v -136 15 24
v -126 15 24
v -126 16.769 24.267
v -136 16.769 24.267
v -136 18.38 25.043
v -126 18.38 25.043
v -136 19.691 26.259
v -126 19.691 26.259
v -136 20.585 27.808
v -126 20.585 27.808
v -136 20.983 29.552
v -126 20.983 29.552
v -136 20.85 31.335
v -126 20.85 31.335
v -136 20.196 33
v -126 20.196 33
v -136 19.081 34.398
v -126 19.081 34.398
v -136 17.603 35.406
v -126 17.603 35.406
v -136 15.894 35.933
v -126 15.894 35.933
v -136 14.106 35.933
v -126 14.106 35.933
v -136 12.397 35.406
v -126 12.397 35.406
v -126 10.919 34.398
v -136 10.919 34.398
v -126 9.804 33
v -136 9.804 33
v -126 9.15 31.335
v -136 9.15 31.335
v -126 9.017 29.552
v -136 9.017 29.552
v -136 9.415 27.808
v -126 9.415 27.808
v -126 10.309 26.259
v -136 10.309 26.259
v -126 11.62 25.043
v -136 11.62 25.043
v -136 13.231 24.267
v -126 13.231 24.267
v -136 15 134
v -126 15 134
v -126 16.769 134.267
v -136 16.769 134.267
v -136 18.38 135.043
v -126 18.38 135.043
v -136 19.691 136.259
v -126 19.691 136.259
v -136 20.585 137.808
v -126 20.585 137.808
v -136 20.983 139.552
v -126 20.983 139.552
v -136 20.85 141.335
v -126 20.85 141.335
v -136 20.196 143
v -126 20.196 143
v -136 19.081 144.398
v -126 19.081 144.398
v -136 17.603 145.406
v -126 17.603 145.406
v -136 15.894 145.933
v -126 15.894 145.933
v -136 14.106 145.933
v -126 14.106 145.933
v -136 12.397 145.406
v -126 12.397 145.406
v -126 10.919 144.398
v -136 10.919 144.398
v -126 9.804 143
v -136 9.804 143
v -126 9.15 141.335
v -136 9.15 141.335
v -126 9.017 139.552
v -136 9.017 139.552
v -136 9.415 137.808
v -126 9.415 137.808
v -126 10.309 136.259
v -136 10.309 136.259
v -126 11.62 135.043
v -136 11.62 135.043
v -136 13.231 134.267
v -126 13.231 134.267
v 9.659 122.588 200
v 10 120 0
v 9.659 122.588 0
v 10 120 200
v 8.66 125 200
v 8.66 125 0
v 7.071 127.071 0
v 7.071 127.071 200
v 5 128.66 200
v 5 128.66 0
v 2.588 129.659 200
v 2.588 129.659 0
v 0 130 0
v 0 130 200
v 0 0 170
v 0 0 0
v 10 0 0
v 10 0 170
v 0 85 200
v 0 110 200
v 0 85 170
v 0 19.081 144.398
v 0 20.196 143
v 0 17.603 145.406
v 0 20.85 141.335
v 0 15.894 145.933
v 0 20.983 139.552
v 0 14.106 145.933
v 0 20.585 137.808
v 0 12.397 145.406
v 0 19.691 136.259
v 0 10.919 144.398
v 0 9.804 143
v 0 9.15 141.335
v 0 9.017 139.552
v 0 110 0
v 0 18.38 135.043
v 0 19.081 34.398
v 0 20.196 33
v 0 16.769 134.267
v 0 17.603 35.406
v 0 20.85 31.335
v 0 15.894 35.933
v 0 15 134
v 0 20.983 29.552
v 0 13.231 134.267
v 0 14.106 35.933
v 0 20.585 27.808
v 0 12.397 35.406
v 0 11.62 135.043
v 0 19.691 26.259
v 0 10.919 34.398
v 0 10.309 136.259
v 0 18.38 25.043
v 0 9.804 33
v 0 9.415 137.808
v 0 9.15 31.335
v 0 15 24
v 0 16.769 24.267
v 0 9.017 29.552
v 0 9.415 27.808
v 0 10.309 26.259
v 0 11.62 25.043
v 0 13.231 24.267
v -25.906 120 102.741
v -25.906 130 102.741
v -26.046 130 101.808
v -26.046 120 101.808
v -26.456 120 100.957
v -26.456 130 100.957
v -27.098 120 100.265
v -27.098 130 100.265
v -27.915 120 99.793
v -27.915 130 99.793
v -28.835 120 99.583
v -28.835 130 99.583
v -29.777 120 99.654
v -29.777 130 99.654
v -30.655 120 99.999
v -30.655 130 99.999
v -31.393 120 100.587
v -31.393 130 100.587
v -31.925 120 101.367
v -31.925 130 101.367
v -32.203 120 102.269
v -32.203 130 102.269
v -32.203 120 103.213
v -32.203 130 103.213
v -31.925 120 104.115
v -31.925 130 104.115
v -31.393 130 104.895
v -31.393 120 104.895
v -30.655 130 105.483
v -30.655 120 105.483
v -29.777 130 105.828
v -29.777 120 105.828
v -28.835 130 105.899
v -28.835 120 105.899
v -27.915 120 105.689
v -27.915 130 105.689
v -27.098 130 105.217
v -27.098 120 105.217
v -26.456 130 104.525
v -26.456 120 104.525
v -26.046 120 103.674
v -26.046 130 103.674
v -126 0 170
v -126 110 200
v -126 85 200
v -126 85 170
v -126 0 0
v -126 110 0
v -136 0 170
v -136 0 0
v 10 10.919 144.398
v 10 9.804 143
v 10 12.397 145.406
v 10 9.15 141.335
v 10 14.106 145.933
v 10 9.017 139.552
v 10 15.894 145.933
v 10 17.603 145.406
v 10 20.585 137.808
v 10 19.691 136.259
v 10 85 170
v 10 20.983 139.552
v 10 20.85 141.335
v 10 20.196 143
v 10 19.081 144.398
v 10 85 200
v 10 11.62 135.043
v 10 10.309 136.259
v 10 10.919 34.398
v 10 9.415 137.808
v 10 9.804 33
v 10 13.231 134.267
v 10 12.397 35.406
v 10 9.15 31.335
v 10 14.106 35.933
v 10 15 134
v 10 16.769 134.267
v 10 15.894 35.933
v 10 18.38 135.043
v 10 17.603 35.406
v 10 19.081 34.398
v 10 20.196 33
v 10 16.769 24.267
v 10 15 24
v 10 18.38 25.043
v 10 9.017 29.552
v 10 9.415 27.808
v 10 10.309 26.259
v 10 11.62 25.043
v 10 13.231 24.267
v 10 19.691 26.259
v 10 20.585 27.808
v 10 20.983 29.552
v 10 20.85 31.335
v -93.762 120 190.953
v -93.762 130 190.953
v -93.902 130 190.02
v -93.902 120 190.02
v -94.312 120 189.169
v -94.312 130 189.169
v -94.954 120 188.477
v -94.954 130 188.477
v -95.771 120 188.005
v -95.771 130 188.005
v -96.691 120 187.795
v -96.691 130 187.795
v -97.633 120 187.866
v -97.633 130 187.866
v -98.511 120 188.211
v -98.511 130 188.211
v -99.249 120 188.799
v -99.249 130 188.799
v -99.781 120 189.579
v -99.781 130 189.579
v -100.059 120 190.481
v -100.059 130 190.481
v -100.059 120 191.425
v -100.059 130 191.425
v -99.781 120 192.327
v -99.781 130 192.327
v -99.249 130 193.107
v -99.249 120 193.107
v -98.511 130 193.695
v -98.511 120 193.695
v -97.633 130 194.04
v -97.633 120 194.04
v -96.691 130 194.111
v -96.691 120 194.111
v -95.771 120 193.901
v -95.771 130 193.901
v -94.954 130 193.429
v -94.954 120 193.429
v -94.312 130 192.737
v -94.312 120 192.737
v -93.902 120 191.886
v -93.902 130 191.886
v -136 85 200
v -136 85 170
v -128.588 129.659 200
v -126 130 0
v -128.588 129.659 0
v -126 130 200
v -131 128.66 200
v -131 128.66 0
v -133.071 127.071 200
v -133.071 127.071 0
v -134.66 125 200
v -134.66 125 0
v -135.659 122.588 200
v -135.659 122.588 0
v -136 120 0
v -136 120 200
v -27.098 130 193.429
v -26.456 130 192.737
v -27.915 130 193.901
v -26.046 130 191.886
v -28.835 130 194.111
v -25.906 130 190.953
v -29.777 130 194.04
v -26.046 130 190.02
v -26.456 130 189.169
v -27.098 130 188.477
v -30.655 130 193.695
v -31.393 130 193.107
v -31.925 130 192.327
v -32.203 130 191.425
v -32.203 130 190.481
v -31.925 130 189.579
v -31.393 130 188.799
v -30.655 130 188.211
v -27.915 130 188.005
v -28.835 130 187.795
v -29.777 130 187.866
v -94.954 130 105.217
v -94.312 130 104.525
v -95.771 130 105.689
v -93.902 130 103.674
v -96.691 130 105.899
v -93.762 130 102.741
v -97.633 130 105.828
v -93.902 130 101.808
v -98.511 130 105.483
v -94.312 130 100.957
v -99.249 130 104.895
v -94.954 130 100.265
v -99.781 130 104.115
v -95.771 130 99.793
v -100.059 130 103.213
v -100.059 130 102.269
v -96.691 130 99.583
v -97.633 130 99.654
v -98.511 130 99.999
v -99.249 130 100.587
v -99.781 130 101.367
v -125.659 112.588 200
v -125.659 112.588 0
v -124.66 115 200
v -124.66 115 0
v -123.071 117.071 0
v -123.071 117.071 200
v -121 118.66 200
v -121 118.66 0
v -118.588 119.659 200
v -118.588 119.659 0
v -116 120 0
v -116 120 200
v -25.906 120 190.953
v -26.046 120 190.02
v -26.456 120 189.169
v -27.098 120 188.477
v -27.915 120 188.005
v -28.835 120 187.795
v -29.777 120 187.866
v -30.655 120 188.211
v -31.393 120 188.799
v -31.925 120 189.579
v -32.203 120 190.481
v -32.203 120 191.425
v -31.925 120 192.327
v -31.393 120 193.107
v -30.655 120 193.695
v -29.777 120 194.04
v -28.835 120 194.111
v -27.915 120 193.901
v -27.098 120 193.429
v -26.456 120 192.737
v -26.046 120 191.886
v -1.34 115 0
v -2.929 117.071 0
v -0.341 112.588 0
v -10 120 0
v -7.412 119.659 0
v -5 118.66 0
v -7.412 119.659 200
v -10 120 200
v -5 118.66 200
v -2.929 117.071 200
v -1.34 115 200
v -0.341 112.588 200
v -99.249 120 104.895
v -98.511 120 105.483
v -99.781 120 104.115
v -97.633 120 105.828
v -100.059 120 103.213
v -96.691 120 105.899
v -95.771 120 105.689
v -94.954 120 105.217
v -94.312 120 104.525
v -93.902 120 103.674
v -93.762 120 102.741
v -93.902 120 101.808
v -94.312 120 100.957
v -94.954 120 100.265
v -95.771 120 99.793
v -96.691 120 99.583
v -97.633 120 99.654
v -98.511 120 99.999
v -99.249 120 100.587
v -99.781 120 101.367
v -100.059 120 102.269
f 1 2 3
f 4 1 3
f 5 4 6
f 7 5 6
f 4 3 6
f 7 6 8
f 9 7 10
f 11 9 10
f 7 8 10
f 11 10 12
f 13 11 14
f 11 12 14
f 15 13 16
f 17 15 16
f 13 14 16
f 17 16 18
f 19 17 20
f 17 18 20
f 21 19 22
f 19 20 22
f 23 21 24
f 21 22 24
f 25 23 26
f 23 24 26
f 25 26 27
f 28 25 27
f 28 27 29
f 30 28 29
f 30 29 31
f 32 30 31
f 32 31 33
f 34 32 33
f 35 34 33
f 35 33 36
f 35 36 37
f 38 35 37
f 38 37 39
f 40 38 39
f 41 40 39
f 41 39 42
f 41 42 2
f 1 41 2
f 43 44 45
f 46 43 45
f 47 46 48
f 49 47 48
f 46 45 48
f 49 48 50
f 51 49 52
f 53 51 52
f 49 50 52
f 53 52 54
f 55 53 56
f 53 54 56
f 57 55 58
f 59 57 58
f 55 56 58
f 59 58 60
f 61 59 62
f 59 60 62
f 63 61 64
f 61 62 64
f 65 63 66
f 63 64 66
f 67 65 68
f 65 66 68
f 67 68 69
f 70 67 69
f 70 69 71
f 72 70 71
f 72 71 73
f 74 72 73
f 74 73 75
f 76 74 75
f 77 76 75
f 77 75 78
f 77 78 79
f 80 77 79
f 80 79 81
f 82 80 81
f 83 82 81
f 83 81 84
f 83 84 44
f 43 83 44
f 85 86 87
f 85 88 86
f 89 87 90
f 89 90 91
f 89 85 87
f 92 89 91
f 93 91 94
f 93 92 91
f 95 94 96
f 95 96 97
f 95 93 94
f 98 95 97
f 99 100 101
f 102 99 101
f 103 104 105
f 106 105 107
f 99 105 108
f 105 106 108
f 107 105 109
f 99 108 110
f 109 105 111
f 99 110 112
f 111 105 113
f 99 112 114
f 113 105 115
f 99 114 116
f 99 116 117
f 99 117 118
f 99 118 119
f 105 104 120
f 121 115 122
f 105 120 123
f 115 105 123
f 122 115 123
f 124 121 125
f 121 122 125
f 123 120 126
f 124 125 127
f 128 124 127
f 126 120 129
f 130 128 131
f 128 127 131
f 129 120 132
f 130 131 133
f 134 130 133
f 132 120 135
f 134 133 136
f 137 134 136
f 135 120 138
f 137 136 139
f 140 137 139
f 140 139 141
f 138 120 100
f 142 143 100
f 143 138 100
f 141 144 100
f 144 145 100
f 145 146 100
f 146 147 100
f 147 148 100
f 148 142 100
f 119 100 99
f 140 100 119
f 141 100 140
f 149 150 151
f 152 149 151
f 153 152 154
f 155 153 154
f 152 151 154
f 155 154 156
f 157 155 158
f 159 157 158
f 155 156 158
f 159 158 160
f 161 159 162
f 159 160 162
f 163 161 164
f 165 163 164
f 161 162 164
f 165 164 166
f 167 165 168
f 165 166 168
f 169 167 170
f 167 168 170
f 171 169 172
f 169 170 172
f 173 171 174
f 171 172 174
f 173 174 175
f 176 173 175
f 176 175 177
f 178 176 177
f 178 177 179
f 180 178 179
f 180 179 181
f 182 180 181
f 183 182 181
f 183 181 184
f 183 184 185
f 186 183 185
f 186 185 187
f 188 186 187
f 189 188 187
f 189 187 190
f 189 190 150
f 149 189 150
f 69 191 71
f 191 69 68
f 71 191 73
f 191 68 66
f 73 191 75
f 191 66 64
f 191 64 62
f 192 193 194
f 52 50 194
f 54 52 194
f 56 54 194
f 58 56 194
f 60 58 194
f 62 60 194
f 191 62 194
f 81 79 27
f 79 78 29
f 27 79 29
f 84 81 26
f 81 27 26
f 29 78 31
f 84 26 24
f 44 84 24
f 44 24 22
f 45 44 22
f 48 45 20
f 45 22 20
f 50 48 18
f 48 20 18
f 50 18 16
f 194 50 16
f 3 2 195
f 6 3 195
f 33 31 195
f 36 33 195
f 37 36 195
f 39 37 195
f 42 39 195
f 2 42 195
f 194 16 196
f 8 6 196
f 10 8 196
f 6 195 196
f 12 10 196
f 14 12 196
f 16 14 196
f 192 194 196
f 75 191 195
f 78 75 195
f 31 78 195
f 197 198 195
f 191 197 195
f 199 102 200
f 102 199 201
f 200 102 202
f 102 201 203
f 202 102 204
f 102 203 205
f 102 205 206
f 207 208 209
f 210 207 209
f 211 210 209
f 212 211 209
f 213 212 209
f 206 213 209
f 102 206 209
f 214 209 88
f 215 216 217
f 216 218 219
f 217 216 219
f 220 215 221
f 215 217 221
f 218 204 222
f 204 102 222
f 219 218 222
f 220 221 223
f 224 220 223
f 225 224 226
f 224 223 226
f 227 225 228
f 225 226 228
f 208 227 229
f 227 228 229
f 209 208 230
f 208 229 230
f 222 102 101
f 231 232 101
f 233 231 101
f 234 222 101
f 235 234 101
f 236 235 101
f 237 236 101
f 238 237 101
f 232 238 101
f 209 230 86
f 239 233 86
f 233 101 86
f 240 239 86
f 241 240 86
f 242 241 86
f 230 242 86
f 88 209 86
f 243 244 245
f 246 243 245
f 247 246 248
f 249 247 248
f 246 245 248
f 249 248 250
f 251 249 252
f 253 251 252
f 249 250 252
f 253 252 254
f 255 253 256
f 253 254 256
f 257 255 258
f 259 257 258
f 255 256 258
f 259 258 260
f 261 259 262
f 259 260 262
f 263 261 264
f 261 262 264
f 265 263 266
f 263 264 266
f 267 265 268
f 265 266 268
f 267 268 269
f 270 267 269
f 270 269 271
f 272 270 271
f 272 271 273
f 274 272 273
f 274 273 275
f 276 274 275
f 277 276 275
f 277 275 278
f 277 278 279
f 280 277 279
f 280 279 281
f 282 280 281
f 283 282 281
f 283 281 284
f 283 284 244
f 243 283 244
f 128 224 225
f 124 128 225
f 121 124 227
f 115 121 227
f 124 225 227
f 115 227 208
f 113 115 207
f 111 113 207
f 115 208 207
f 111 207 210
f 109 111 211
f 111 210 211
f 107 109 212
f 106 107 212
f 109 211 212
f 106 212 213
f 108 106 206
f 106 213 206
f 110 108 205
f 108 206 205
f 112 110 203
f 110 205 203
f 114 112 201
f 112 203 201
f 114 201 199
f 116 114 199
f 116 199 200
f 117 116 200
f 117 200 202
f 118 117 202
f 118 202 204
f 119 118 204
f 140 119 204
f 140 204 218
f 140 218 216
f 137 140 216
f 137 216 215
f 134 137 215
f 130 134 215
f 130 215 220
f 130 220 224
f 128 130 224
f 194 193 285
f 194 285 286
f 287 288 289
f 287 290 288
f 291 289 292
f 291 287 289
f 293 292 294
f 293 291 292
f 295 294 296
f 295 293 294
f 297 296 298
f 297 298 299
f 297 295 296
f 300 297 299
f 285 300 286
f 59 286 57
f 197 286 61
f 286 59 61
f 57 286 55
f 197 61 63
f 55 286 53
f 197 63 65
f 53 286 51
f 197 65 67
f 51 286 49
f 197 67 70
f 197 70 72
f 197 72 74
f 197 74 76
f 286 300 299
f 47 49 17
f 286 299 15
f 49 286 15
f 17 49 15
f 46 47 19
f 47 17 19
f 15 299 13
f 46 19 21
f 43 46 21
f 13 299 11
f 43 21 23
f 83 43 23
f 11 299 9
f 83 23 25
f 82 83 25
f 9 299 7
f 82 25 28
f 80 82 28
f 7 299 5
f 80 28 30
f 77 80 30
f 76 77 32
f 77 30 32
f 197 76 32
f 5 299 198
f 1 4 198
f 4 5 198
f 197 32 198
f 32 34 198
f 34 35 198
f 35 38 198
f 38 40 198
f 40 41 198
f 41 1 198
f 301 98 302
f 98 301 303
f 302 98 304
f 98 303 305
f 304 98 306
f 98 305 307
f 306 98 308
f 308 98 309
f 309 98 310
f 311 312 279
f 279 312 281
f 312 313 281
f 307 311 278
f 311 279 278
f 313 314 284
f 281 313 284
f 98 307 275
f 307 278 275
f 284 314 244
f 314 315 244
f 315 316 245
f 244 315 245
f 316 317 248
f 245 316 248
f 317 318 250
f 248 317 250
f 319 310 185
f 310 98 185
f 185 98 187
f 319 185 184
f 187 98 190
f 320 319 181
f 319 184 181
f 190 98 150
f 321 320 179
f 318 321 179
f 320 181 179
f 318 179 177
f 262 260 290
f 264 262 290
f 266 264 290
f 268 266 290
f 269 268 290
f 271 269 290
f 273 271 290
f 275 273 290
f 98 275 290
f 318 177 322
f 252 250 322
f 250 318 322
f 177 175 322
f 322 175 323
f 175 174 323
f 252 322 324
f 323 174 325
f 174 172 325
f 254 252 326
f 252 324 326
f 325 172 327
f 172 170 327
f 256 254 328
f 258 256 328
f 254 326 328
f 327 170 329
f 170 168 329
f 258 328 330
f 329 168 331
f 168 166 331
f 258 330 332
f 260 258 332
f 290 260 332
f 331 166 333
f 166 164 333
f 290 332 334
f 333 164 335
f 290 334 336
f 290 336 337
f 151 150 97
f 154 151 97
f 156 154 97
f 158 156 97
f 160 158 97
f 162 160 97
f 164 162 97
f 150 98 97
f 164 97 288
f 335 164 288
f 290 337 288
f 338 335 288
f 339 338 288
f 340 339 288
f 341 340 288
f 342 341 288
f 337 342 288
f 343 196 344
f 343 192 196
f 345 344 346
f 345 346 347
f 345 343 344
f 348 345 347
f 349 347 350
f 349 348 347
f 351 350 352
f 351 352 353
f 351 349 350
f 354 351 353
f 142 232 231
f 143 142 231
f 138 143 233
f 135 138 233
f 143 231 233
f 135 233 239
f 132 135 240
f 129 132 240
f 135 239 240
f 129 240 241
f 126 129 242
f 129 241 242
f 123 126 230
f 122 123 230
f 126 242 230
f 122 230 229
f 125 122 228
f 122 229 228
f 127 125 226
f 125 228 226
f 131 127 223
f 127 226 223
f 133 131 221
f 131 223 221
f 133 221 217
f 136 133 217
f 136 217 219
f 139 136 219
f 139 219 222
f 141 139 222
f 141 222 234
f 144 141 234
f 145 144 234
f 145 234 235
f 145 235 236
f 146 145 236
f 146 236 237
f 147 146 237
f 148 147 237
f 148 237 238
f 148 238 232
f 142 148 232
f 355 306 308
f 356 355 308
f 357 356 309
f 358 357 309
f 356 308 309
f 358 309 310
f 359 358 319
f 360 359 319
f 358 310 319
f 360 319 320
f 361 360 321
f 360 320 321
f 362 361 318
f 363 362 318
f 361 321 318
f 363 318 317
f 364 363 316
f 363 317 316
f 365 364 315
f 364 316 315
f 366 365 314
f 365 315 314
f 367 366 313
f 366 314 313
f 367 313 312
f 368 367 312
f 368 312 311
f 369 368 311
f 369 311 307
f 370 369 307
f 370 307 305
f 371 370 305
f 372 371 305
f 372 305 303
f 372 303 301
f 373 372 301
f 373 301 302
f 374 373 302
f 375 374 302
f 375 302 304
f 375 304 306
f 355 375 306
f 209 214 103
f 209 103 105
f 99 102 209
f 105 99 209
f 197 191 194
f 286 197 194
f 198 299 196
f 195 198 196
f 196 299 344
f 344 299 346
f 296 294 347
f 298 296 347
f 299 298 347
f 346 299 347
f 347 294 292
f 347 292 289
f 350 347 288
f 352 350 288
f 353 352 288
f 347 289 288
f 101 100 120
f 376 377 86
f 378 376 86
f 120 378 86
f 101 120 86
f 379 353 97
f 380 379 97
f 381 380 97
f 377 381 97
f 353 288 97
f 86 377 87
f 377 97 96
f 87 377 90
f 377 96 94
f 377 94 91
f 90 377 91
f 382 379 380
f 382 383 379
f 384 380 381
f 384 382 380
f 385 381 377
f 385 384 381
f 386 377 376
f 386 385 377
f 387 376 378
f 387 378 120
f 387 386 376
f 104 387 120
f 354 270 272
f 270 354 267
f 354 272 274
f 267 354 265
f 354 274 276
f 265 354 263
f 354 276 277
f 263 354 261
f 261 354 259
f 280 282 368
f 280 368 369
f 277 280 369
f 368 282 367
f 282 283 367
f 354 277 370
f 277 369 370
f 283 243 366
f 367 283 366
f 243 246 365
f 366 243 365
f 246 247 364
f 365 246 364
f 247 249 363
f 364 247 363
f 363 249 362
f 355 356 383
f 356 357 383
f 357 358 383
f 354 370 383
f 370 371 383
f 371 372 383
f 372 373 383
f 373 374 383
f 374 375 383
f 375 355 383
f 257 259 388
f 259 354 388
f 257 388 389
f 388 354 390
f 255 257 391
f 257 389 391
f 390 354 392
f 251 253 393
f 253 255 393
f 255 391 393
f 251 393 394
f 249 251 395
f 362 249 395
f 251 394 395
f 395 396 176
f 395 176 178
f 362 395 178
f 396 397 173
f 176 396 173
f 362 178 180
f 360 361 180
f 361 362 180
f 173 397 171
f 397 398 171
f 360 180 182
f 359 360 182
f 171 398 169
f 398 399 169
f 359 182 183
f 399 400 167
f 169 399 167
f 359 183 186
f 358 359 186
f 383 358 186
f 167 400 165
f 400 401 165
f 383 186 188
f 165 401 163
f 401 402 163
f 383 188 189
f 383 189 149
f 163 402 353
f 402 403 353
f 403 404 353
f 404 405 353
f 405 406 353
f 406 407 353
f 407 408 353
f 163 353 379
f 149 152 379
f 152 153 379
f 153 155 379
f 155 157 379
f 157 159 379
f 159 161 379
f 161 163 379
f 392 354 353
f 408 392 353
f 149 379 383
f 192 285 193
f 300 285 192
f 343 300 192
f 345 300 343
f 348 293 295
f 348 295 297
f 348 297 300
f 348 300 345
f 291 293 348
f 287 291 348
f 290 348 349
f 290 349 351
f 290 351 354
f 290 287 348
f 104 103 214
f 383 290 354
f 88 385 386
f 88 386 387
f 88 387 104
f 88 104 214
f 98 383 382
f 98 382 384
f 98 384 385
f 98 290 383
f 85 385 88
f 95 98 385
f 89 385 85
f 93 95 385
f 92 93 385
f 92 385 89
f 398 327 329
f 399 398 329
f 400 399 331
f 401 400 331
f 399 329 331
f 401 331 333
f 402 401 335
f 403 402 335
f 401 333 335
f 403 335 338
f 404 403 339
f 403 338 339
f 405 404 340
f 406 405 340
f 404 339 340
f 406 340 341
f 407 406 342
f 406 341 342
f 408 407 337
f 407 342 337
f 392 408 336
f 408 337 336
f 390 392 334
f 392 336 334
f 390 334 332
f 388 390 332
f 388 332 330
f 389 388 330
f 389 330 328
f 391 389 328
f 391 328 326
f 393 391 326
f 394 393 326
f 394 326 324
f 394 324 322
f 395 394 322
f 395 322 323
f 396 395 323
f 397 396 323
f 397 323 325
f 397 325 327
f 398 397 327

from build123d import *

# Parameters (mm, degrees)
SALIENTE_EXTRUIR1_DEPTH = 200
REDONDEO1_R             = 10
CROQUIS2_R              = 6
CORTAR_EXTRUIR1_DEPTH   = 147
CROQUIS3_W              = 30
CROQUIS3_H              = 85
CORTAR_EXTRUIR2_DEPTH   = 147
CORTAR_EXTRUIR3_REACH   = 132
CROQUIS4_R              = 3.1665


with BuildPart() as part:
    # Croquis1 → Saliente-Extruir1 (new body)
    with BuildSketch(Plane.XY):
        Polygon((-136, 0), (-126, 0), (-126, 120), (0, 120), (0, 0), (10, 0), (10, 130), (-136, 130), align=None)
    extrude(amount=SALIENTE_EXTRUIR1_DEPTH)

    # Redondeo1
    redondeo1_edges = [part.edges().sort_by_distance(p)[0] for p in [
        (-136, 130, 100),
        (10, 130, 100),
        (0, 120, 100),
        (-126, 120, 100),
    ]]
    fillet(redondeo1_edges, radius=REDONDEO1_R)

    # Croquis2 → Cortar-Extruir1 (cut, through all)
    with BuildSketch(Plane(origin=(10, 0, 0), x_dir=(0, 0, -1), z_dir=(1, 0, 0))):
        with Locations((-140, 15)):
            Circle(CROQUIS2_R)
        with Locations((-30, 15)):
            Circle(CROQUIS2_R)
    extrude(amount=-CORTAR_EXTRUIR1_DEPTH, mode=Mode.SUBTRACT)

    # Croquis3 → Cortar-Extruir2 (cut, through all)
    with BuildSketch(Plane(origin=(10, 0, 0), x_dir=(0, 0, -1), z_dir=(1, 0, 0))):
        with Locations((-185, 42.5)):
            Rectangle(CROQUIS3_W, CROQUIS3_H)
    extrude(amount=-CORTAR_EXTRUIR2_DEPTH, mode=Mode.SUBTRACT)

    # Croquis4 → Cortar-Extruir3 (cut, up to next)
    with BuildSketch(Plane(origin=(0, 130, 0), x_dir=(1, 0, 0), z_dir=(0, 1, 0)), mode=Mode.PRIVATE) as cortar_extruir3_sk1:
        with Locations((-96.928, -190.953)):
            Circle(CROQUIS4_R)
    cortar_extruir3_tool1 = extrude(cortar_extruir3_sk1.sketch, amount=-CORTAR_EXTRUIR3_REACH, mode=Mode.PRIVATE) & part.part
    add(cortar_extruir3_tool1.solids().sort_by_distance((-96.928, 130, 190.953))[0], mode=Mode.SUBTRACT)
    # Croquis4 → Cortar-Extruir3 (cut, up to next)
    with BuildSketch(Plane(origin=(0, 130, 0), x_dir=(1, 0, 0), z_dir=(0, 1, 0)), mode=Mode.PRIVATE) as cortar_extruir3_sk2:
        with Locations((-29.072, -190.953)):
            Circle(CROQUIS4_R)
    cortar_extruir3_tool2 = extrude(cortar_extruir3_sk2.sketch, amount=-CORTAR_EXTRUIR3_REACH, mode=Mode.PRIVATE) & part.part
    add(cortar_extruir3_tool2.solids().sort_by_distance((-29.072, 130, 190.953))[0], mode=Mode.SUBTRACT)
    # Croquis4 → Cortar-Extruir3 (cut, up to next)
    with BuildSketch(Plane(origin=(0, 130, 0), x_dir=(1, 0, 0), z_dir=(0, 1, 0)), mode=Mode.PRIVATE) as cortar_extruir3_sk3:
        with Locations((-96.928, -102.741)):
            Circle(CROQUIS4_R)
    cortar_extruir3_tool3 = extrude(cortar_extruir3_sk3.sketch, amount=-CORTAR_EXTRUIR3_REACH, mode=Mode.PRIVATE) & part.part
    add(cortar_extruir3_tool3.solids().sort_by_distance((-96.928, 130, 102.741))[0], mode=Mode.SUBTRACT)
    # Croquis4 → Cortar-Extruir3 (cut, up to next)
    with BuildSketch(Plane(origin=(0, 130, 0), x_dir=(1, 0, 0), z_dir=(0, 1, 0)), mode=Mode.PRIVATE) as cortar_extruir3_sk4:
        with Locations((-29.072, -102.741)):
            Circle(CROQUIS4_R)
    cortar_extruir3_tool4 = extrude(cortar_extruir3_sk4.sketch, amount=-CORTAR_EXTRUIR3_REACH, mode=Mode.PRIVATE) & part.part
    add(cortar_extruir3_tool4.solids().sort_by_distance((-29.072, 130, 102.741))[0], mode=Mode.SUBTRACT)


solid = part.part
